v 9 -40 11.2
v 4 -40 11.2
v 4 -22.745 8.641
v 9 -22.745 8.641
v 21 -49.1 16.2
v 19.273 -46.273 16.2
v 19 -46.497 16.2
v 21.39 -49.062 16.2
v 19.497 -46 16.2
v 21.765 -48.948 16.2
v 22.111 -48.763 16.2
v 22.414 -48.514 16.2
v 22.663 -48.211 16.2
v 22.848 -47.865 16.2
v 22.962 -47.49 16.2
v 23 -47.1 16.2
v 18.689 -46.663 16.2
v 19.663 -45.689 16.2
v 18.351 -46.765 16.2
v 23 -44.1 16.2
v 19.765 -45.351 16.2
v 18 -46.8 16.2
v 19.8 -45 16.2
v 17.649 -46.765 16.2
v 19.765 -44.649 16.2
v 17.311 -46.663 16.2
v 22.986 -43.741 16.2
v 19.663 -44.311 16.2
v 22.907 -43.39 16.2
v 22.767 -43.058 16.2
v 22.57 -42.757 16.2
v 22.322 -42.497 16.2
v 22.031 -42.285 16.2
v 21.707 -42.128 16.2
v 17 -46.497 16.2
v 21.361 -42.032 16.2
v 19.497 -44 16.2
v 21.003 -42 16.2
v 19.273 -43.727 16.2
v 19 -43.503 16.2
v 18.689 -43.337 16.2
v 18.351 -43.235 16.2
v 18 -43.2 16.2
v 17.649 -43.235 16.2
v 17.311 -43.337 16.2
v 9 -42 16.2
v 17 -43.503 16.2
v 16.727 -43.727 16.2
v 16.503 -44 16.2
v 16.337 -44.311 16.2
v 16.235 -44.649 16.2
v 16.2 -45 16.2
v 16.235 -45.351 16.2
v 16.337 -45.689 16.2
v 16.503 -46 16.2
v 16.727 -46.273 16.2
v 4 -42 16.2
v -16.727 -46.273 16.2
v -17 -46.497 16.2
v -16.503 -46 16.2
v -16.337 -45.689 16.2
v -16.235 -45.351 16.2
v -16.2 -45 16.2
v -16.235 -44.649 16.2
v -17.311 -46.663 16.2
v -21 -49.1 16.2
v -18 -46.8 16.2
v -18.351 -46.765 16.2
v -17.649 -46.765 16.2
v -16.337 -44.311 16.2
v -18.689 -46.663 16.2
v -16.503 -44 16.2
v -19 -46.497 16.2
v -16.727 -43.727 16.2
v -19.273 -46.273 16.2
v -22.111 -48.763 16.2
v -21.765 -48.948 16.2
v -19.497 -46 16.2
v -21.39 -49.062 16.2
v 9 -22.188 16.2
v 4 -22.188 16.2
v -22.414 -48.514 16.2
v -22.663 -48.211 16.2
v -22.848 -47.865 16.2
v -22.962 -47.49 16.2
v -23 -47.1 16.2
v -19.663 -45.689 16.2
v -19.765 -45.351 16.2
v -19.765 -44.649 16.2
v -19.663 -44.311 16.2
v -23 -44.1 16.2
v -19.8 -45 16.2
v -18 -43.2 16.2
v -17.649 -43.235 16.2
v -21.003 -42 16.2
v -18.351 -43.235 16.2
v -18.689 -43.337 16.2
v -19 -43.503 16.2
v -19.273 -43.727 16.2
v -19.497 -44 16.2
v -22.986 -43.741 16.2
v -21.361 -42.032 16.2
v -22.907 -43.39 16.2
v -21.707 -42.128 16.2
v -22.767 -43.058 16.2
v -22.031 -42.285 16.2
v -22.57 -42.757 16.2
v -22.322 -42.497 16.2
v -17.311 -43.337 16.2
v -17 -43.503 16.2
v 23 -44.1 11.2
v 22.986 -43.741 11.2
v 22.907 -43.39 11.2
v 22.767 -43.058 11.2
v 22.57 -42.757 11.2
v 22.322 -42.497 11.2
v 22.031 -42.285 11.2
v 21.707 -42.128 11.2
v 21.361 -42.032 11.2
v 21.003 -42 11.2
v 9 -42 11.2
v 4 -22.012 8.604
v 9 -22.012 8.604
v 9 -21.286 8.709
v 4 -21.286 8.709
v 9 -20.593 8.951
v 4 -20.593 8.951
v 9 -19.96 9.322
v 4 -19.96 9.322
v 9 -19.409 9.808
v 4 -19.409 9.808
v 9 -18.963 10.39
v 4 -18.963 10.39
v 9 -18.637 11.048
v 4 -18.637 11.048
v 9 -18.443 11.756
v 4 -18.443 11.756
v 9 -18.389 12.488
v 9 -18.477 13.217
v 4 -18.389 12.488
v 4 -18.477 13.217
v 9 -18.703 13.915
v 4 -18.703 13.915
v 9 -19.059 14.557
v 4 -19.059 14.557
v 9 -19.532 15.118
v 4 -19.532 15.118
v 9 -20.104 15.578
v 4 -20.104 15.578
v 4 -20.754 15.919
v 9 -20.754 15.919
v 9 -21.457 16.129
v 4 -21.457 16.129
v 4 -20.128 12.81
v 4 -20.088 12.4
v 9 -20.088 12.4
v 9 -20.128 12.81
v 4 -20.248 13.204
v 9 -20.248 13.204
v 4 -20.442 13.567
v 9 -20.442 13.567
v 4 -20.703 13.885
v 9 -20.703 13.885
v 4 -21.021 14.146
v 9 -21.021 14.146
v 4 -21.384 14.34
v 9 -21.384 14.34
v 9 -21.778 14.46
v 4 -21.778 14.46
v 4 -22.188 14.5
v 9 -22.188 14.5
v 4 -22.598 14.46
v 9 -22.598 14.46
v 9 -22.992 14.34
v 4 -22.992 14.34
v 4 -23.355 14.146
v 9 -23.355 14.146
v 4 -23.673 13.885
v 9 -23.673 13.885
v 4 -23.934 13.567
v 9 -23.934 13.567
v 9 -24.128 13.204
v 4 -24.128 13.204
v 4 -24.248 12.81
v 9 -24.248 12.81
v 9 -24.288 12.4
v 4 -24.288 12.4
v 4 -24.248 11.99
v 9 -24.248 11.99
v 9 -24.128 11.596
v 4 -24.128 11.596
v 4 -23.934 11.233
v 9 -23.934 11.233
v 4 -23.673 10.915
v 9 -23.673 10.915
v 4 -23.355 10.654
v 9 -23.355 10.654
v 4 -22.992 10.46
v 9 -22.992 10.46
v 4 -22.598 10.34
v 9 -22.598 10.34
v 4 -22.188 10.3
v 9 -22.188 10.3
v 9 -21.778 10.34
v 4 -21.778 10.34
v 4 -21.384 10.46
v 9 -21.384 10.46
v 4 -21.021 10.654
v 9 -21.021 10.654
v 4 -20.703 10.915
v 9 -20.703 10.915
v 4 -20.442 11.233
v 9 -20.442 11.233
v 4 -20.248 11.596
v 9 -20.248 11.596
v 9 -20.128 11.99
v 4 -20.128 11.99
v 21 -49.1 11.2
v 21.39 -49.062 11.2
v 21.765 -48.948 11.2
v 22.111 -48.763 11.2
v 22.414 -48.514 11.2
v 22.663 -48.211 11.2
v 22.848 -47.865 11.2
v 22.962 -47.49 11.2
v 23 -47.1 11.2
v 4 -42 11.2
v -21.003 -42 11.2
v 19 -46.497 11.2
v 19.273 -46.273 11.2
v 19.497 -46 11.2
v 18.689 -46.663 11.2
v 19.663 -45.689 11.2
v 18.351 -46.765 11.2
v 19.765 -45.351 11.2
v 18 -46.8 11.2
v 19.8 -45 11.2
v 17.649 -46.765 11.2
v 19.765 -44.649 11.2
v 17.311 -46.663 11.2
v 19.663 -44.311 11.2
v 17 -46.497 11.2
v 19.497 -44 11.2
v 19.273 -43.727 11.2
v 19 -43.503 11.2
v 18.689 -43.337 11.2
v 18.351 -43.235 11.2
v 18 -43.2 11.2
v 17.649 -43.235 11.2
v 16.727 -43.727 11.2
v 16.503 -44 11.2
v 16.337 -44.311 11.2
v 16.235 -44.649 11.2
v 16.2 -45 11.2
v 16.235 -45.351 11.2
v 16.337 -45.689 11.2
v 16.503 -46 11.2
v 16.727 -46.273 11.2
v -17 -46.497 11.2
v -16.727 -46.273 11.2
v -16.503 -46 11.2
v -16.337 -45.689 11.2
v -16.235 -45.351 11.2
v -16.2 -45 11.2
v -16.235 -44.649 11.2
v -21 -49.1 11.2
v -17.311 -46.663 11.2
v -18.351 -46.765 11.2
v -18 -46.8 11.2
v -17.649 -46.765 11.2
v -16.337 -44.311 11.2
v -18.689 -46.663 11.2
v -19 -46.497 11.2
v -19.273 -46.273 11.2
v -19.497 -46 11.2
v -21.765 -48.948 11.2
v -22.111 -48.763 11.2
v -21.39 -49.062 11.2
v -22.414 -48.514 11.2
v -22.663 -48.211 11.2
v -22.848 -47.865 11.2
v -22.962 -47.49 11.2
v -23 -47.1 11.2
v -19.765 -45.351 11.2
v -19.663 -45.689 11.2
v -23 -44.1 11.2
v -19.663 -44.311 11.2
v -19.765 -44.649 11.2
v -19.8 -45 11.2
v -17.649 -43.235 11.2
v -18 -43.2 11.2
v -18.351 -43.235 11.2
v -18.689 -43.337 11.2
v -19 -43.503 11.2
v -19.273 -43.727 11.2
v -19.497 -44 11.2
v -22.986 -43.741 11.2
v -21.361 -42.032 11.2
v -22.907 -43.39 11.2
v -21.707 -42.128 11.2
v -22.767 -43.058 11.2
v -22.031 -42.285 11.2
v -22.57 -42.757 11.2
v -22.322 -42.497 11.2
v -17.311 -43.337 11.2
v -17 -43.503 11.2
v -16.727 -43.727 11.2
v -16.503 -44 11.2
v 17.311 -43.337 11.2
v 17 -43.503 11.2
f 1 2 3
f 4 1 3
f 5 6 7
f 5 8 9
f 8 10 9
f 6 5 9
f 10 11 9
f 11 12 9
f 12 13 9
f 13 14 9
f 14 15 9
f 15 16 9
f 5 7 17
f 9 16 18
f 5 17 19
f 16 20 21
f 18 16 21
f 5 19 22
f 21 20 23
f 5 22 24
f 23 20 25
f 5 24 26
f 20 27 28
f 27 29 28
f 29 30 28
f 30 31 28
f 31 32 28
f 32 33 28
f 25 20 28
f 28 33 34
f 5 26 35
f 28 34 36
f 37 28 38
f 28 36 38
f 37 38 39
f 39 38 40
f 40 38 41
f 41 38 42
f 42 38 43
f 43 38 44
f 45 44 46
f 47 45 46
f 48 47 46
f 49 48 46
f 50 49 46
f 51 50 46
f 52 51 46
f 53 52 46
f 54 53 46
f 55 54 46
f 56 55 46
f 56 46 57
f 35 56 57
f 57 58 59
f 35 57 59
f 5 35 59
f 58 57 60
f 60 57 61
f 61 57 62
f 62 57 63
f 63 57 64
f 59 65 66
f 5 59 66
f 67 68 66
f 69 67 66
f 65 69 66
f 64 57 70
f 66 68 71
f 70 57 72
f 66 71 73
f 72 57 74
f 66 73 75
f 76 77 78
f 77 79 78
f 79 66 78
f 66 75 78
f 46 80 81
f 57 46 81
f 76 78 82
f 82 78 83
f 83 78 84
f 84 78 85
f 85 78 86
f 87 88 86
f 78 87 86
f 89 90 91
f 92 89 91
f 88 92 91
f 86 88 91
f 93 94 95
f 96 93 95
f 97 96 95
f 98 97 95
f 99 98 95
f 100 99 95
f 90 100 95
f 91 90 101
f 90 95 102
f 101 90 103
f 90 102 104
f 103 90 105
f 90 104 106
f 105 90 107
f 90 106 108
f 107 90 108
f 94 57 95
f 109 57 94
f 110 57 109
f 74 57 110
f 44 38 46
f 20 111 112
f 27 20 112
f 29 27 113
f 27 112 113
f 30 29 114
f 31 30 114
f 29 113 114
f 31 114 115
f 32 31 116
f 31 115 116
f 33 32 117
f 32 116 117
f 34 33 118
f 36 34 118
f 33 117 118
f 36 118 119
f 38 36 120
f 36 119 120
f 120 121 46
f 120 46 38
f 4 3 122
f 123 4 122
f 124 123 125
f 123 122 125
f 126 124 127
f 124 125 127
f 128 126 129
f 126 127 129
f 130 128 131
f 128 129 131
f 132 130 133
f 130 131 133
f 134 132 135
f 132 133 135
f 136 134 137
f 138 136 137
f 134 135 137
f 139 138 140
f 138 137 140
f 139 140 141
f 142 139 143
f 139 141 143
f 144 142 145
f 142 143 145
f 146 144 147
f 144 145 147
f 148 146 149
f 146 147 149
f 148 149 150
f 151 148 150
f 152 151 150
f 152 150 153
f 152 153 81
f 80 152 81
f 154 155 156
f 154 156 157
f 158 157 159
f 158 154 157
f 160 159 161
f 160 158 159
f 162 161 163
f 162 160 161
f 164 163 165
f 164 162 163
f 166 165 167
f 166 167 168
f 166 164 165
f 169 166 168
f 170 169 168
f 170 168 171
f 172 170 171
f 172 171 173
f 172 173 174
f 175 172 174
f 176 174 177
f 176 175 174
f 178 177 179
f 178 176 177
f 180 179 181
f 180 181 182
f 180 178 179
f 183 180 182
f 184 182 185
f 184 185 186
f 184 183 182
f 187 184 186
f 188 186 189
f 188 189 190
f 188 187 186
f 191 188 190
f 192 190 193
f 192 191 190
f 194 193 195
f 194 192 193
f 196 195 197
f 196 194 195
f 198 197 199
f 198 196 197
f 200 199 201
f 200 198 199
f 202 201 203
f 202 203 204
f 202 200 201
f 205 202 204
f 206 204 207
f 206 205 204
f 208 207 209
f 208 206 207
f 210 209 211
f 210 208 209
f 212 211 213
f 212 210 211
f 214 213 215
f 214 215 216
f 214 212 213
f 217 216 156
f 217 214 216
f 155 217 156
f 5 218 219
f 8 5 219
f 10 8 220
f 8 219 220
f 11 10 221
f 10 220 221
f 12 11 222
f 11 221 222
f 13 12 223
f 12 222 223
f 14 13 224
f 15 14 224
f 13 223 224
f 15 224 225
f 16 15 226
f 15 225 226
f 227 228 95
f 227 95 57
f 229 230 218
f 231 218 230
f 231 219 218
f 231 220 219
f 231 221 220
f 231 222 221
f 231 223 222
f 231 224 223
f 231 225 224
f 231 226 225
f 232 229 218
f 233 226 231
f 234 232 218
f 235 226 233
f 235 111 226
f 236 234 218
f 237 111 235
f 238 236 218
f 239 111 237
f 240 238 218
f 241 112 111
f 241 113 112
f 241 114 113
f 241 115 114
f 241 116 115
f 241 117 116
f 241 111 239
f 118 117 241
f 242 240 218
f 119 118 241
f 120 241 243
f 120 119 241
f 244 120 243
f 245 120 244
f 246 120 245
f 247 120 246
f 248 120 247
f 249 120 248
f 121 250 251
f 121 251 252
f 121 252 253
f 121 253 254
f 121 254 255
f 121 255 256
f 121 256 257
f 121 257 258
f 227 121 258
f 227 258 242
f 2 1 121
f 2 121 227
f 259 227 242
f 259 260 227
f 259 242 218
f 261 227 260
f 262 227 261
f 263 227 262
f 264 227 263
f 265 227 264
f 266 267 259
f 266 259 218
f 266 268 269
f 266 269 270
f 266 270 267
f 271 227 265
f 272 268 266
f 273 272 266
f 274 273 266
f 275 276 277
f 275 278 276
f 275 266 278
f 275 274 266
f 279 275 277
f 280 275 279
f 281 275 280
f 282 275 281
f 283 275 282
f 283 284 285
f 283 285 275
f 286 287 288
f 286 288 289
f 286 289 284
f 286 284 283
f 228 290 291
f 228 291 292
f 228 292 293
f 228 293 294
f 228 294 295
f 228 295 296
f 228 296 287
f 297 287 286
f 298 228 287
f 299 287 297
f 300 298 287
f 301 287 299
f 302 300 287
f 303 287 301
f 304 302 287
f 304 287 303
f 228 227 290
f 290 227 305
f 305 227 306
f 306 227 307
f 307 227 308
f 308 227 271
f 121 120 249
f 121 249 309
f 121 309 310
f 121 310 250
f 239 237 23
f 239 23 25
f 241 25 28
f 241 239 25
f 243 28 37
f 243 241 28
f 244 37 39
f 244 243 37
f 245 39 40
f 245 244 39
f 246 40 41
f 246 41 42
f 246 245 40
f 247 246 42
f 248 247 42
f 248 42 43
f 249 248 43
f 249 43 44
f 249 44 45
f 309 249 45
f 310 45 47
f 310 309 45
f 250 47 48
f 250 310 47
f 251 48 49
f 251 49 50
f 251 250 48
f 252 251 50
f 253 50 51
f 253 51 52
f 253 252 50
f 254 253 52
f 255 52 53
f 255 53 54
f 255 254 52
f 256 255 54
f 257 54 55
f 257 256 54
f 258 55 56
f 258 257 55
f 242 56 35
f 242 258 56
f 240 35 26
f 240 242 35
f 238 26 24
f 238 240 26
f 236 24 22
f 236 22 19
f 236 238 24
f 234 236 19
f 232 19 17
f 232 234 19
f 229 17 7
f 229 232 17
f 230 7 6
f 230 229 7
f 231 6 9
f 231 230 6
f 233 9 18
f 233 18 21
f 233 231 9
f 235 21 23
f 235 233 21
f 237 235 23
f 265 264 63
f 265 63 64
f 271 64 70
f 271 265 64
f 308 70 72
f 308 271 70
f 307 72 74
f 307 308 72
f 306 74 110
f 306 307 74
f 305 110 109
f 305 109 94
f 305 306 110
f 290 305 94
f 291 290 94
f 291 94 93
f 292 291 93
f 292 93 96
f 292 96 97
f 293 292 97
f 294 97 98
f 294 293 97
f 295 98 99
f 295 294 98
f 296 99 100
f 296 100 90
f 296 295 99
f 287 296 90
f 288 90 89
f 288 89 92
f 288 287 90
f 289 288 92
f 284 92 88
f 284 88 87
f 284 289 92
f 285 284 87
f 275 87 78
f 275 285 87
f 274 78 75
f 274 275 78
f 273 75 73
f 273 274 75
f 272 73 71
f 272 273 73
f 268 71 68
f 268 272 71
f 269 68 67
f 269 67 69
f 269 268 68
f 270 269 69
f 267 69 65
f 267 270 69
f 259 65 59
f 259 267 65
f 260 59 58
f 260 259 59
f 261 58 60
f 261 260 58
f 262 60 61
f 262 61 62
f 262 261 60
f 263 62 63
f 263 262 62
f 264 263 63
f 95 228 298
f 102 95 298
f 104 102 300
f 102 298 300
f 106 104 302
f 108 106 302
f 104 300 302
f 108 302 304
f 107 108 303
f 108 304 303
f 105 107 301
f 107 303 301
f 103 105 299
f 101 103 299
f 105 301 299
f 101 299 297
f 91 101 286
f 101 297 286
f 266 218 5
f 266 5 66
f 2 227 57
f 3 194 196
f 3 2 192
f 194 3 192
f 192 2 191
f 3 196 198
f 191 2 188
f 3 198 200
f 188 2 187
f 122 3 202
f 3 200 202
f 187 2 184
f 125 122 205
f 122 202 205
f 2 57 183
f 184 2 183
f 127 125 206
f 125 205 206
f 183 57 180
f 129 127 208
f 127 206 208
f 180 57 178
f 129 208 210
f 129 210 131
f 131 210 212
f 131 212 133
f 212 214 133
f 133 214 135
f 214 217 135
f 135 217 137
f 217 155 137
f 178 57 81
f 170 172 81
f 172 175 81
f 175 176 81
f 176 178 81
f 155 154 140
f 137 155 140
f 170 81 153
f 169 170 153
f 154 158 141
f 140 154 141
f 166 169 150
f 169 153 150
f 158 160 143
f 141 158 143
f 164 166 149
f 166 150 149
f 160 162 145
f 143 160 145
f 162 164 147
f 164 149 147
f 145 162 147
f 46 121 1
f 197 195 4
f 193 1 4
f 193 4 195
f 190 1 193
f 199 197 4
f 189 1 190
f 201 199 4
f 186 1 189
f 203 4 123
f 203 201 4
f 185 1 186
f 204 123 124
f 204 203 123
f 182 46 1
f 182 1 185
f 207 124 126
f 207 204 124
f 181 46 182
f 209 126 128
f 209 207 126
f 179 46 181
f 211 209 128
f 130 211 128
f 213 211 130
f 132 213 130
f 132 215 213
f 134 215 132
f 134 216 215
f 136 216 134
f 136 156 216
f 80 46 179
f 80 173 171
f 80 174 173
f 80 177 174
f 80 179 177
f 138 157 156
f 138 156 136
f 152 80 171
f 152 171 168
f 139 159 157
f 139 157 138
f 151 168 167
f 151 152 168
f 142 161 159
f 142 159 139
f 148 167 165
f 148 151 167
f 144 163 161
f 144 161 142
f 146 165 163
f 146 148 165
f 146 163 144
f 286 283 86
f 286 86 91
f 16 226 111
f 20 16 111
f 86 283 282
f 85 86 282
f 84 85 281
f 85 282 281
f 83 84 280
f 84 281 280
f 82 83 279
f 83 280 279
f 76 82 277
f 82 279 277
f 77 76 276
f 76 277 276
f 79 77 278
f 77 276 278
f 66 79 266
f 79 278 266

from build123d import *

# Parameters (mm, degrees)
SKETCH009_R      = 1.8
EXTRUDE008_DEPTH = 5
SKETCH008_R      = 2.1
EXTRUDE007_DEPTH = 5


with BuildPart() as extrude008:
    # Sketch009 → Extrude008 (new body)
    with BuildSketch(Plane.XY):
        with BuildLine():
            Line((-21.002502, -42), (21.002502, -42))
            ThreePointArc((23, -44.1), (22.451639, -42.621595), (21.002502, -42))
            Line((23, -47.1), (23, -44.1))
            ThreePointArc((21, -49.1), (22.414214, -48.514214), (23, -47.1))
            Line((21, -49.1), (-21, -49.1))
            ThreePointArc((-23, -47.1), (-22.414214, -48.514214), (-21, -49.1))
            Line((-23, -47.1), (-23, -44.1))
            ThreePointArc((-21.002502, -42), (-22.451639, -42.621595), (-23, -44.1))
        make_face()
        with Locations((-18, -45)):
            Circle(SKETCH009_R, mode=Mode.SUBTRACT)
        with Locations((18, -45)):
            Circle(SKETCH009_R, mode=Mode.SUBTRACT)
    extrude(amount=EXTRUDE008_DEPTH)


with BuildPart() as extrude008_1:
    # Extrude008 placement: moved
    add(extrude008.part.moved(Location((0, 0, 11.2))))


with BuildPart() as mho_other_side_fusion:
    # Sketch008 → Extrude007 (new body)
    with BuildSketch(Plane.YZ):
        with BuildLine():
            Line((-49, 11.2), (-40, 11.2))
            Line((-40, 11.2), (-22.745353, 8.64111))
            ThreePointArc((-22.745353, 8.64111), (-18.398196, 12.120519), (-22.187904, 16.2))
            Line((-22.187904, 16.2), (-49, 16.2))
            Line((-49, 16.2), (-49, 11.2))
        make_face()
        with Locations((-22.187904, 12.4)):
            Circle(SKETCH008_R, mode=Mode.SUBTRACT)
    extrude(amount=EXTRUDE007_DEPTH)


with BuildPart() as mho_other_side_fusion_1:
    # Extrude007 placement: moved
    add(mho_other_side_fusion.part.moved(Location((4, 0, 0))))

    # Fusion009: union Extrude008
    add(extrude008_1.part)


solid = mho_other_side_fusion_1.part
